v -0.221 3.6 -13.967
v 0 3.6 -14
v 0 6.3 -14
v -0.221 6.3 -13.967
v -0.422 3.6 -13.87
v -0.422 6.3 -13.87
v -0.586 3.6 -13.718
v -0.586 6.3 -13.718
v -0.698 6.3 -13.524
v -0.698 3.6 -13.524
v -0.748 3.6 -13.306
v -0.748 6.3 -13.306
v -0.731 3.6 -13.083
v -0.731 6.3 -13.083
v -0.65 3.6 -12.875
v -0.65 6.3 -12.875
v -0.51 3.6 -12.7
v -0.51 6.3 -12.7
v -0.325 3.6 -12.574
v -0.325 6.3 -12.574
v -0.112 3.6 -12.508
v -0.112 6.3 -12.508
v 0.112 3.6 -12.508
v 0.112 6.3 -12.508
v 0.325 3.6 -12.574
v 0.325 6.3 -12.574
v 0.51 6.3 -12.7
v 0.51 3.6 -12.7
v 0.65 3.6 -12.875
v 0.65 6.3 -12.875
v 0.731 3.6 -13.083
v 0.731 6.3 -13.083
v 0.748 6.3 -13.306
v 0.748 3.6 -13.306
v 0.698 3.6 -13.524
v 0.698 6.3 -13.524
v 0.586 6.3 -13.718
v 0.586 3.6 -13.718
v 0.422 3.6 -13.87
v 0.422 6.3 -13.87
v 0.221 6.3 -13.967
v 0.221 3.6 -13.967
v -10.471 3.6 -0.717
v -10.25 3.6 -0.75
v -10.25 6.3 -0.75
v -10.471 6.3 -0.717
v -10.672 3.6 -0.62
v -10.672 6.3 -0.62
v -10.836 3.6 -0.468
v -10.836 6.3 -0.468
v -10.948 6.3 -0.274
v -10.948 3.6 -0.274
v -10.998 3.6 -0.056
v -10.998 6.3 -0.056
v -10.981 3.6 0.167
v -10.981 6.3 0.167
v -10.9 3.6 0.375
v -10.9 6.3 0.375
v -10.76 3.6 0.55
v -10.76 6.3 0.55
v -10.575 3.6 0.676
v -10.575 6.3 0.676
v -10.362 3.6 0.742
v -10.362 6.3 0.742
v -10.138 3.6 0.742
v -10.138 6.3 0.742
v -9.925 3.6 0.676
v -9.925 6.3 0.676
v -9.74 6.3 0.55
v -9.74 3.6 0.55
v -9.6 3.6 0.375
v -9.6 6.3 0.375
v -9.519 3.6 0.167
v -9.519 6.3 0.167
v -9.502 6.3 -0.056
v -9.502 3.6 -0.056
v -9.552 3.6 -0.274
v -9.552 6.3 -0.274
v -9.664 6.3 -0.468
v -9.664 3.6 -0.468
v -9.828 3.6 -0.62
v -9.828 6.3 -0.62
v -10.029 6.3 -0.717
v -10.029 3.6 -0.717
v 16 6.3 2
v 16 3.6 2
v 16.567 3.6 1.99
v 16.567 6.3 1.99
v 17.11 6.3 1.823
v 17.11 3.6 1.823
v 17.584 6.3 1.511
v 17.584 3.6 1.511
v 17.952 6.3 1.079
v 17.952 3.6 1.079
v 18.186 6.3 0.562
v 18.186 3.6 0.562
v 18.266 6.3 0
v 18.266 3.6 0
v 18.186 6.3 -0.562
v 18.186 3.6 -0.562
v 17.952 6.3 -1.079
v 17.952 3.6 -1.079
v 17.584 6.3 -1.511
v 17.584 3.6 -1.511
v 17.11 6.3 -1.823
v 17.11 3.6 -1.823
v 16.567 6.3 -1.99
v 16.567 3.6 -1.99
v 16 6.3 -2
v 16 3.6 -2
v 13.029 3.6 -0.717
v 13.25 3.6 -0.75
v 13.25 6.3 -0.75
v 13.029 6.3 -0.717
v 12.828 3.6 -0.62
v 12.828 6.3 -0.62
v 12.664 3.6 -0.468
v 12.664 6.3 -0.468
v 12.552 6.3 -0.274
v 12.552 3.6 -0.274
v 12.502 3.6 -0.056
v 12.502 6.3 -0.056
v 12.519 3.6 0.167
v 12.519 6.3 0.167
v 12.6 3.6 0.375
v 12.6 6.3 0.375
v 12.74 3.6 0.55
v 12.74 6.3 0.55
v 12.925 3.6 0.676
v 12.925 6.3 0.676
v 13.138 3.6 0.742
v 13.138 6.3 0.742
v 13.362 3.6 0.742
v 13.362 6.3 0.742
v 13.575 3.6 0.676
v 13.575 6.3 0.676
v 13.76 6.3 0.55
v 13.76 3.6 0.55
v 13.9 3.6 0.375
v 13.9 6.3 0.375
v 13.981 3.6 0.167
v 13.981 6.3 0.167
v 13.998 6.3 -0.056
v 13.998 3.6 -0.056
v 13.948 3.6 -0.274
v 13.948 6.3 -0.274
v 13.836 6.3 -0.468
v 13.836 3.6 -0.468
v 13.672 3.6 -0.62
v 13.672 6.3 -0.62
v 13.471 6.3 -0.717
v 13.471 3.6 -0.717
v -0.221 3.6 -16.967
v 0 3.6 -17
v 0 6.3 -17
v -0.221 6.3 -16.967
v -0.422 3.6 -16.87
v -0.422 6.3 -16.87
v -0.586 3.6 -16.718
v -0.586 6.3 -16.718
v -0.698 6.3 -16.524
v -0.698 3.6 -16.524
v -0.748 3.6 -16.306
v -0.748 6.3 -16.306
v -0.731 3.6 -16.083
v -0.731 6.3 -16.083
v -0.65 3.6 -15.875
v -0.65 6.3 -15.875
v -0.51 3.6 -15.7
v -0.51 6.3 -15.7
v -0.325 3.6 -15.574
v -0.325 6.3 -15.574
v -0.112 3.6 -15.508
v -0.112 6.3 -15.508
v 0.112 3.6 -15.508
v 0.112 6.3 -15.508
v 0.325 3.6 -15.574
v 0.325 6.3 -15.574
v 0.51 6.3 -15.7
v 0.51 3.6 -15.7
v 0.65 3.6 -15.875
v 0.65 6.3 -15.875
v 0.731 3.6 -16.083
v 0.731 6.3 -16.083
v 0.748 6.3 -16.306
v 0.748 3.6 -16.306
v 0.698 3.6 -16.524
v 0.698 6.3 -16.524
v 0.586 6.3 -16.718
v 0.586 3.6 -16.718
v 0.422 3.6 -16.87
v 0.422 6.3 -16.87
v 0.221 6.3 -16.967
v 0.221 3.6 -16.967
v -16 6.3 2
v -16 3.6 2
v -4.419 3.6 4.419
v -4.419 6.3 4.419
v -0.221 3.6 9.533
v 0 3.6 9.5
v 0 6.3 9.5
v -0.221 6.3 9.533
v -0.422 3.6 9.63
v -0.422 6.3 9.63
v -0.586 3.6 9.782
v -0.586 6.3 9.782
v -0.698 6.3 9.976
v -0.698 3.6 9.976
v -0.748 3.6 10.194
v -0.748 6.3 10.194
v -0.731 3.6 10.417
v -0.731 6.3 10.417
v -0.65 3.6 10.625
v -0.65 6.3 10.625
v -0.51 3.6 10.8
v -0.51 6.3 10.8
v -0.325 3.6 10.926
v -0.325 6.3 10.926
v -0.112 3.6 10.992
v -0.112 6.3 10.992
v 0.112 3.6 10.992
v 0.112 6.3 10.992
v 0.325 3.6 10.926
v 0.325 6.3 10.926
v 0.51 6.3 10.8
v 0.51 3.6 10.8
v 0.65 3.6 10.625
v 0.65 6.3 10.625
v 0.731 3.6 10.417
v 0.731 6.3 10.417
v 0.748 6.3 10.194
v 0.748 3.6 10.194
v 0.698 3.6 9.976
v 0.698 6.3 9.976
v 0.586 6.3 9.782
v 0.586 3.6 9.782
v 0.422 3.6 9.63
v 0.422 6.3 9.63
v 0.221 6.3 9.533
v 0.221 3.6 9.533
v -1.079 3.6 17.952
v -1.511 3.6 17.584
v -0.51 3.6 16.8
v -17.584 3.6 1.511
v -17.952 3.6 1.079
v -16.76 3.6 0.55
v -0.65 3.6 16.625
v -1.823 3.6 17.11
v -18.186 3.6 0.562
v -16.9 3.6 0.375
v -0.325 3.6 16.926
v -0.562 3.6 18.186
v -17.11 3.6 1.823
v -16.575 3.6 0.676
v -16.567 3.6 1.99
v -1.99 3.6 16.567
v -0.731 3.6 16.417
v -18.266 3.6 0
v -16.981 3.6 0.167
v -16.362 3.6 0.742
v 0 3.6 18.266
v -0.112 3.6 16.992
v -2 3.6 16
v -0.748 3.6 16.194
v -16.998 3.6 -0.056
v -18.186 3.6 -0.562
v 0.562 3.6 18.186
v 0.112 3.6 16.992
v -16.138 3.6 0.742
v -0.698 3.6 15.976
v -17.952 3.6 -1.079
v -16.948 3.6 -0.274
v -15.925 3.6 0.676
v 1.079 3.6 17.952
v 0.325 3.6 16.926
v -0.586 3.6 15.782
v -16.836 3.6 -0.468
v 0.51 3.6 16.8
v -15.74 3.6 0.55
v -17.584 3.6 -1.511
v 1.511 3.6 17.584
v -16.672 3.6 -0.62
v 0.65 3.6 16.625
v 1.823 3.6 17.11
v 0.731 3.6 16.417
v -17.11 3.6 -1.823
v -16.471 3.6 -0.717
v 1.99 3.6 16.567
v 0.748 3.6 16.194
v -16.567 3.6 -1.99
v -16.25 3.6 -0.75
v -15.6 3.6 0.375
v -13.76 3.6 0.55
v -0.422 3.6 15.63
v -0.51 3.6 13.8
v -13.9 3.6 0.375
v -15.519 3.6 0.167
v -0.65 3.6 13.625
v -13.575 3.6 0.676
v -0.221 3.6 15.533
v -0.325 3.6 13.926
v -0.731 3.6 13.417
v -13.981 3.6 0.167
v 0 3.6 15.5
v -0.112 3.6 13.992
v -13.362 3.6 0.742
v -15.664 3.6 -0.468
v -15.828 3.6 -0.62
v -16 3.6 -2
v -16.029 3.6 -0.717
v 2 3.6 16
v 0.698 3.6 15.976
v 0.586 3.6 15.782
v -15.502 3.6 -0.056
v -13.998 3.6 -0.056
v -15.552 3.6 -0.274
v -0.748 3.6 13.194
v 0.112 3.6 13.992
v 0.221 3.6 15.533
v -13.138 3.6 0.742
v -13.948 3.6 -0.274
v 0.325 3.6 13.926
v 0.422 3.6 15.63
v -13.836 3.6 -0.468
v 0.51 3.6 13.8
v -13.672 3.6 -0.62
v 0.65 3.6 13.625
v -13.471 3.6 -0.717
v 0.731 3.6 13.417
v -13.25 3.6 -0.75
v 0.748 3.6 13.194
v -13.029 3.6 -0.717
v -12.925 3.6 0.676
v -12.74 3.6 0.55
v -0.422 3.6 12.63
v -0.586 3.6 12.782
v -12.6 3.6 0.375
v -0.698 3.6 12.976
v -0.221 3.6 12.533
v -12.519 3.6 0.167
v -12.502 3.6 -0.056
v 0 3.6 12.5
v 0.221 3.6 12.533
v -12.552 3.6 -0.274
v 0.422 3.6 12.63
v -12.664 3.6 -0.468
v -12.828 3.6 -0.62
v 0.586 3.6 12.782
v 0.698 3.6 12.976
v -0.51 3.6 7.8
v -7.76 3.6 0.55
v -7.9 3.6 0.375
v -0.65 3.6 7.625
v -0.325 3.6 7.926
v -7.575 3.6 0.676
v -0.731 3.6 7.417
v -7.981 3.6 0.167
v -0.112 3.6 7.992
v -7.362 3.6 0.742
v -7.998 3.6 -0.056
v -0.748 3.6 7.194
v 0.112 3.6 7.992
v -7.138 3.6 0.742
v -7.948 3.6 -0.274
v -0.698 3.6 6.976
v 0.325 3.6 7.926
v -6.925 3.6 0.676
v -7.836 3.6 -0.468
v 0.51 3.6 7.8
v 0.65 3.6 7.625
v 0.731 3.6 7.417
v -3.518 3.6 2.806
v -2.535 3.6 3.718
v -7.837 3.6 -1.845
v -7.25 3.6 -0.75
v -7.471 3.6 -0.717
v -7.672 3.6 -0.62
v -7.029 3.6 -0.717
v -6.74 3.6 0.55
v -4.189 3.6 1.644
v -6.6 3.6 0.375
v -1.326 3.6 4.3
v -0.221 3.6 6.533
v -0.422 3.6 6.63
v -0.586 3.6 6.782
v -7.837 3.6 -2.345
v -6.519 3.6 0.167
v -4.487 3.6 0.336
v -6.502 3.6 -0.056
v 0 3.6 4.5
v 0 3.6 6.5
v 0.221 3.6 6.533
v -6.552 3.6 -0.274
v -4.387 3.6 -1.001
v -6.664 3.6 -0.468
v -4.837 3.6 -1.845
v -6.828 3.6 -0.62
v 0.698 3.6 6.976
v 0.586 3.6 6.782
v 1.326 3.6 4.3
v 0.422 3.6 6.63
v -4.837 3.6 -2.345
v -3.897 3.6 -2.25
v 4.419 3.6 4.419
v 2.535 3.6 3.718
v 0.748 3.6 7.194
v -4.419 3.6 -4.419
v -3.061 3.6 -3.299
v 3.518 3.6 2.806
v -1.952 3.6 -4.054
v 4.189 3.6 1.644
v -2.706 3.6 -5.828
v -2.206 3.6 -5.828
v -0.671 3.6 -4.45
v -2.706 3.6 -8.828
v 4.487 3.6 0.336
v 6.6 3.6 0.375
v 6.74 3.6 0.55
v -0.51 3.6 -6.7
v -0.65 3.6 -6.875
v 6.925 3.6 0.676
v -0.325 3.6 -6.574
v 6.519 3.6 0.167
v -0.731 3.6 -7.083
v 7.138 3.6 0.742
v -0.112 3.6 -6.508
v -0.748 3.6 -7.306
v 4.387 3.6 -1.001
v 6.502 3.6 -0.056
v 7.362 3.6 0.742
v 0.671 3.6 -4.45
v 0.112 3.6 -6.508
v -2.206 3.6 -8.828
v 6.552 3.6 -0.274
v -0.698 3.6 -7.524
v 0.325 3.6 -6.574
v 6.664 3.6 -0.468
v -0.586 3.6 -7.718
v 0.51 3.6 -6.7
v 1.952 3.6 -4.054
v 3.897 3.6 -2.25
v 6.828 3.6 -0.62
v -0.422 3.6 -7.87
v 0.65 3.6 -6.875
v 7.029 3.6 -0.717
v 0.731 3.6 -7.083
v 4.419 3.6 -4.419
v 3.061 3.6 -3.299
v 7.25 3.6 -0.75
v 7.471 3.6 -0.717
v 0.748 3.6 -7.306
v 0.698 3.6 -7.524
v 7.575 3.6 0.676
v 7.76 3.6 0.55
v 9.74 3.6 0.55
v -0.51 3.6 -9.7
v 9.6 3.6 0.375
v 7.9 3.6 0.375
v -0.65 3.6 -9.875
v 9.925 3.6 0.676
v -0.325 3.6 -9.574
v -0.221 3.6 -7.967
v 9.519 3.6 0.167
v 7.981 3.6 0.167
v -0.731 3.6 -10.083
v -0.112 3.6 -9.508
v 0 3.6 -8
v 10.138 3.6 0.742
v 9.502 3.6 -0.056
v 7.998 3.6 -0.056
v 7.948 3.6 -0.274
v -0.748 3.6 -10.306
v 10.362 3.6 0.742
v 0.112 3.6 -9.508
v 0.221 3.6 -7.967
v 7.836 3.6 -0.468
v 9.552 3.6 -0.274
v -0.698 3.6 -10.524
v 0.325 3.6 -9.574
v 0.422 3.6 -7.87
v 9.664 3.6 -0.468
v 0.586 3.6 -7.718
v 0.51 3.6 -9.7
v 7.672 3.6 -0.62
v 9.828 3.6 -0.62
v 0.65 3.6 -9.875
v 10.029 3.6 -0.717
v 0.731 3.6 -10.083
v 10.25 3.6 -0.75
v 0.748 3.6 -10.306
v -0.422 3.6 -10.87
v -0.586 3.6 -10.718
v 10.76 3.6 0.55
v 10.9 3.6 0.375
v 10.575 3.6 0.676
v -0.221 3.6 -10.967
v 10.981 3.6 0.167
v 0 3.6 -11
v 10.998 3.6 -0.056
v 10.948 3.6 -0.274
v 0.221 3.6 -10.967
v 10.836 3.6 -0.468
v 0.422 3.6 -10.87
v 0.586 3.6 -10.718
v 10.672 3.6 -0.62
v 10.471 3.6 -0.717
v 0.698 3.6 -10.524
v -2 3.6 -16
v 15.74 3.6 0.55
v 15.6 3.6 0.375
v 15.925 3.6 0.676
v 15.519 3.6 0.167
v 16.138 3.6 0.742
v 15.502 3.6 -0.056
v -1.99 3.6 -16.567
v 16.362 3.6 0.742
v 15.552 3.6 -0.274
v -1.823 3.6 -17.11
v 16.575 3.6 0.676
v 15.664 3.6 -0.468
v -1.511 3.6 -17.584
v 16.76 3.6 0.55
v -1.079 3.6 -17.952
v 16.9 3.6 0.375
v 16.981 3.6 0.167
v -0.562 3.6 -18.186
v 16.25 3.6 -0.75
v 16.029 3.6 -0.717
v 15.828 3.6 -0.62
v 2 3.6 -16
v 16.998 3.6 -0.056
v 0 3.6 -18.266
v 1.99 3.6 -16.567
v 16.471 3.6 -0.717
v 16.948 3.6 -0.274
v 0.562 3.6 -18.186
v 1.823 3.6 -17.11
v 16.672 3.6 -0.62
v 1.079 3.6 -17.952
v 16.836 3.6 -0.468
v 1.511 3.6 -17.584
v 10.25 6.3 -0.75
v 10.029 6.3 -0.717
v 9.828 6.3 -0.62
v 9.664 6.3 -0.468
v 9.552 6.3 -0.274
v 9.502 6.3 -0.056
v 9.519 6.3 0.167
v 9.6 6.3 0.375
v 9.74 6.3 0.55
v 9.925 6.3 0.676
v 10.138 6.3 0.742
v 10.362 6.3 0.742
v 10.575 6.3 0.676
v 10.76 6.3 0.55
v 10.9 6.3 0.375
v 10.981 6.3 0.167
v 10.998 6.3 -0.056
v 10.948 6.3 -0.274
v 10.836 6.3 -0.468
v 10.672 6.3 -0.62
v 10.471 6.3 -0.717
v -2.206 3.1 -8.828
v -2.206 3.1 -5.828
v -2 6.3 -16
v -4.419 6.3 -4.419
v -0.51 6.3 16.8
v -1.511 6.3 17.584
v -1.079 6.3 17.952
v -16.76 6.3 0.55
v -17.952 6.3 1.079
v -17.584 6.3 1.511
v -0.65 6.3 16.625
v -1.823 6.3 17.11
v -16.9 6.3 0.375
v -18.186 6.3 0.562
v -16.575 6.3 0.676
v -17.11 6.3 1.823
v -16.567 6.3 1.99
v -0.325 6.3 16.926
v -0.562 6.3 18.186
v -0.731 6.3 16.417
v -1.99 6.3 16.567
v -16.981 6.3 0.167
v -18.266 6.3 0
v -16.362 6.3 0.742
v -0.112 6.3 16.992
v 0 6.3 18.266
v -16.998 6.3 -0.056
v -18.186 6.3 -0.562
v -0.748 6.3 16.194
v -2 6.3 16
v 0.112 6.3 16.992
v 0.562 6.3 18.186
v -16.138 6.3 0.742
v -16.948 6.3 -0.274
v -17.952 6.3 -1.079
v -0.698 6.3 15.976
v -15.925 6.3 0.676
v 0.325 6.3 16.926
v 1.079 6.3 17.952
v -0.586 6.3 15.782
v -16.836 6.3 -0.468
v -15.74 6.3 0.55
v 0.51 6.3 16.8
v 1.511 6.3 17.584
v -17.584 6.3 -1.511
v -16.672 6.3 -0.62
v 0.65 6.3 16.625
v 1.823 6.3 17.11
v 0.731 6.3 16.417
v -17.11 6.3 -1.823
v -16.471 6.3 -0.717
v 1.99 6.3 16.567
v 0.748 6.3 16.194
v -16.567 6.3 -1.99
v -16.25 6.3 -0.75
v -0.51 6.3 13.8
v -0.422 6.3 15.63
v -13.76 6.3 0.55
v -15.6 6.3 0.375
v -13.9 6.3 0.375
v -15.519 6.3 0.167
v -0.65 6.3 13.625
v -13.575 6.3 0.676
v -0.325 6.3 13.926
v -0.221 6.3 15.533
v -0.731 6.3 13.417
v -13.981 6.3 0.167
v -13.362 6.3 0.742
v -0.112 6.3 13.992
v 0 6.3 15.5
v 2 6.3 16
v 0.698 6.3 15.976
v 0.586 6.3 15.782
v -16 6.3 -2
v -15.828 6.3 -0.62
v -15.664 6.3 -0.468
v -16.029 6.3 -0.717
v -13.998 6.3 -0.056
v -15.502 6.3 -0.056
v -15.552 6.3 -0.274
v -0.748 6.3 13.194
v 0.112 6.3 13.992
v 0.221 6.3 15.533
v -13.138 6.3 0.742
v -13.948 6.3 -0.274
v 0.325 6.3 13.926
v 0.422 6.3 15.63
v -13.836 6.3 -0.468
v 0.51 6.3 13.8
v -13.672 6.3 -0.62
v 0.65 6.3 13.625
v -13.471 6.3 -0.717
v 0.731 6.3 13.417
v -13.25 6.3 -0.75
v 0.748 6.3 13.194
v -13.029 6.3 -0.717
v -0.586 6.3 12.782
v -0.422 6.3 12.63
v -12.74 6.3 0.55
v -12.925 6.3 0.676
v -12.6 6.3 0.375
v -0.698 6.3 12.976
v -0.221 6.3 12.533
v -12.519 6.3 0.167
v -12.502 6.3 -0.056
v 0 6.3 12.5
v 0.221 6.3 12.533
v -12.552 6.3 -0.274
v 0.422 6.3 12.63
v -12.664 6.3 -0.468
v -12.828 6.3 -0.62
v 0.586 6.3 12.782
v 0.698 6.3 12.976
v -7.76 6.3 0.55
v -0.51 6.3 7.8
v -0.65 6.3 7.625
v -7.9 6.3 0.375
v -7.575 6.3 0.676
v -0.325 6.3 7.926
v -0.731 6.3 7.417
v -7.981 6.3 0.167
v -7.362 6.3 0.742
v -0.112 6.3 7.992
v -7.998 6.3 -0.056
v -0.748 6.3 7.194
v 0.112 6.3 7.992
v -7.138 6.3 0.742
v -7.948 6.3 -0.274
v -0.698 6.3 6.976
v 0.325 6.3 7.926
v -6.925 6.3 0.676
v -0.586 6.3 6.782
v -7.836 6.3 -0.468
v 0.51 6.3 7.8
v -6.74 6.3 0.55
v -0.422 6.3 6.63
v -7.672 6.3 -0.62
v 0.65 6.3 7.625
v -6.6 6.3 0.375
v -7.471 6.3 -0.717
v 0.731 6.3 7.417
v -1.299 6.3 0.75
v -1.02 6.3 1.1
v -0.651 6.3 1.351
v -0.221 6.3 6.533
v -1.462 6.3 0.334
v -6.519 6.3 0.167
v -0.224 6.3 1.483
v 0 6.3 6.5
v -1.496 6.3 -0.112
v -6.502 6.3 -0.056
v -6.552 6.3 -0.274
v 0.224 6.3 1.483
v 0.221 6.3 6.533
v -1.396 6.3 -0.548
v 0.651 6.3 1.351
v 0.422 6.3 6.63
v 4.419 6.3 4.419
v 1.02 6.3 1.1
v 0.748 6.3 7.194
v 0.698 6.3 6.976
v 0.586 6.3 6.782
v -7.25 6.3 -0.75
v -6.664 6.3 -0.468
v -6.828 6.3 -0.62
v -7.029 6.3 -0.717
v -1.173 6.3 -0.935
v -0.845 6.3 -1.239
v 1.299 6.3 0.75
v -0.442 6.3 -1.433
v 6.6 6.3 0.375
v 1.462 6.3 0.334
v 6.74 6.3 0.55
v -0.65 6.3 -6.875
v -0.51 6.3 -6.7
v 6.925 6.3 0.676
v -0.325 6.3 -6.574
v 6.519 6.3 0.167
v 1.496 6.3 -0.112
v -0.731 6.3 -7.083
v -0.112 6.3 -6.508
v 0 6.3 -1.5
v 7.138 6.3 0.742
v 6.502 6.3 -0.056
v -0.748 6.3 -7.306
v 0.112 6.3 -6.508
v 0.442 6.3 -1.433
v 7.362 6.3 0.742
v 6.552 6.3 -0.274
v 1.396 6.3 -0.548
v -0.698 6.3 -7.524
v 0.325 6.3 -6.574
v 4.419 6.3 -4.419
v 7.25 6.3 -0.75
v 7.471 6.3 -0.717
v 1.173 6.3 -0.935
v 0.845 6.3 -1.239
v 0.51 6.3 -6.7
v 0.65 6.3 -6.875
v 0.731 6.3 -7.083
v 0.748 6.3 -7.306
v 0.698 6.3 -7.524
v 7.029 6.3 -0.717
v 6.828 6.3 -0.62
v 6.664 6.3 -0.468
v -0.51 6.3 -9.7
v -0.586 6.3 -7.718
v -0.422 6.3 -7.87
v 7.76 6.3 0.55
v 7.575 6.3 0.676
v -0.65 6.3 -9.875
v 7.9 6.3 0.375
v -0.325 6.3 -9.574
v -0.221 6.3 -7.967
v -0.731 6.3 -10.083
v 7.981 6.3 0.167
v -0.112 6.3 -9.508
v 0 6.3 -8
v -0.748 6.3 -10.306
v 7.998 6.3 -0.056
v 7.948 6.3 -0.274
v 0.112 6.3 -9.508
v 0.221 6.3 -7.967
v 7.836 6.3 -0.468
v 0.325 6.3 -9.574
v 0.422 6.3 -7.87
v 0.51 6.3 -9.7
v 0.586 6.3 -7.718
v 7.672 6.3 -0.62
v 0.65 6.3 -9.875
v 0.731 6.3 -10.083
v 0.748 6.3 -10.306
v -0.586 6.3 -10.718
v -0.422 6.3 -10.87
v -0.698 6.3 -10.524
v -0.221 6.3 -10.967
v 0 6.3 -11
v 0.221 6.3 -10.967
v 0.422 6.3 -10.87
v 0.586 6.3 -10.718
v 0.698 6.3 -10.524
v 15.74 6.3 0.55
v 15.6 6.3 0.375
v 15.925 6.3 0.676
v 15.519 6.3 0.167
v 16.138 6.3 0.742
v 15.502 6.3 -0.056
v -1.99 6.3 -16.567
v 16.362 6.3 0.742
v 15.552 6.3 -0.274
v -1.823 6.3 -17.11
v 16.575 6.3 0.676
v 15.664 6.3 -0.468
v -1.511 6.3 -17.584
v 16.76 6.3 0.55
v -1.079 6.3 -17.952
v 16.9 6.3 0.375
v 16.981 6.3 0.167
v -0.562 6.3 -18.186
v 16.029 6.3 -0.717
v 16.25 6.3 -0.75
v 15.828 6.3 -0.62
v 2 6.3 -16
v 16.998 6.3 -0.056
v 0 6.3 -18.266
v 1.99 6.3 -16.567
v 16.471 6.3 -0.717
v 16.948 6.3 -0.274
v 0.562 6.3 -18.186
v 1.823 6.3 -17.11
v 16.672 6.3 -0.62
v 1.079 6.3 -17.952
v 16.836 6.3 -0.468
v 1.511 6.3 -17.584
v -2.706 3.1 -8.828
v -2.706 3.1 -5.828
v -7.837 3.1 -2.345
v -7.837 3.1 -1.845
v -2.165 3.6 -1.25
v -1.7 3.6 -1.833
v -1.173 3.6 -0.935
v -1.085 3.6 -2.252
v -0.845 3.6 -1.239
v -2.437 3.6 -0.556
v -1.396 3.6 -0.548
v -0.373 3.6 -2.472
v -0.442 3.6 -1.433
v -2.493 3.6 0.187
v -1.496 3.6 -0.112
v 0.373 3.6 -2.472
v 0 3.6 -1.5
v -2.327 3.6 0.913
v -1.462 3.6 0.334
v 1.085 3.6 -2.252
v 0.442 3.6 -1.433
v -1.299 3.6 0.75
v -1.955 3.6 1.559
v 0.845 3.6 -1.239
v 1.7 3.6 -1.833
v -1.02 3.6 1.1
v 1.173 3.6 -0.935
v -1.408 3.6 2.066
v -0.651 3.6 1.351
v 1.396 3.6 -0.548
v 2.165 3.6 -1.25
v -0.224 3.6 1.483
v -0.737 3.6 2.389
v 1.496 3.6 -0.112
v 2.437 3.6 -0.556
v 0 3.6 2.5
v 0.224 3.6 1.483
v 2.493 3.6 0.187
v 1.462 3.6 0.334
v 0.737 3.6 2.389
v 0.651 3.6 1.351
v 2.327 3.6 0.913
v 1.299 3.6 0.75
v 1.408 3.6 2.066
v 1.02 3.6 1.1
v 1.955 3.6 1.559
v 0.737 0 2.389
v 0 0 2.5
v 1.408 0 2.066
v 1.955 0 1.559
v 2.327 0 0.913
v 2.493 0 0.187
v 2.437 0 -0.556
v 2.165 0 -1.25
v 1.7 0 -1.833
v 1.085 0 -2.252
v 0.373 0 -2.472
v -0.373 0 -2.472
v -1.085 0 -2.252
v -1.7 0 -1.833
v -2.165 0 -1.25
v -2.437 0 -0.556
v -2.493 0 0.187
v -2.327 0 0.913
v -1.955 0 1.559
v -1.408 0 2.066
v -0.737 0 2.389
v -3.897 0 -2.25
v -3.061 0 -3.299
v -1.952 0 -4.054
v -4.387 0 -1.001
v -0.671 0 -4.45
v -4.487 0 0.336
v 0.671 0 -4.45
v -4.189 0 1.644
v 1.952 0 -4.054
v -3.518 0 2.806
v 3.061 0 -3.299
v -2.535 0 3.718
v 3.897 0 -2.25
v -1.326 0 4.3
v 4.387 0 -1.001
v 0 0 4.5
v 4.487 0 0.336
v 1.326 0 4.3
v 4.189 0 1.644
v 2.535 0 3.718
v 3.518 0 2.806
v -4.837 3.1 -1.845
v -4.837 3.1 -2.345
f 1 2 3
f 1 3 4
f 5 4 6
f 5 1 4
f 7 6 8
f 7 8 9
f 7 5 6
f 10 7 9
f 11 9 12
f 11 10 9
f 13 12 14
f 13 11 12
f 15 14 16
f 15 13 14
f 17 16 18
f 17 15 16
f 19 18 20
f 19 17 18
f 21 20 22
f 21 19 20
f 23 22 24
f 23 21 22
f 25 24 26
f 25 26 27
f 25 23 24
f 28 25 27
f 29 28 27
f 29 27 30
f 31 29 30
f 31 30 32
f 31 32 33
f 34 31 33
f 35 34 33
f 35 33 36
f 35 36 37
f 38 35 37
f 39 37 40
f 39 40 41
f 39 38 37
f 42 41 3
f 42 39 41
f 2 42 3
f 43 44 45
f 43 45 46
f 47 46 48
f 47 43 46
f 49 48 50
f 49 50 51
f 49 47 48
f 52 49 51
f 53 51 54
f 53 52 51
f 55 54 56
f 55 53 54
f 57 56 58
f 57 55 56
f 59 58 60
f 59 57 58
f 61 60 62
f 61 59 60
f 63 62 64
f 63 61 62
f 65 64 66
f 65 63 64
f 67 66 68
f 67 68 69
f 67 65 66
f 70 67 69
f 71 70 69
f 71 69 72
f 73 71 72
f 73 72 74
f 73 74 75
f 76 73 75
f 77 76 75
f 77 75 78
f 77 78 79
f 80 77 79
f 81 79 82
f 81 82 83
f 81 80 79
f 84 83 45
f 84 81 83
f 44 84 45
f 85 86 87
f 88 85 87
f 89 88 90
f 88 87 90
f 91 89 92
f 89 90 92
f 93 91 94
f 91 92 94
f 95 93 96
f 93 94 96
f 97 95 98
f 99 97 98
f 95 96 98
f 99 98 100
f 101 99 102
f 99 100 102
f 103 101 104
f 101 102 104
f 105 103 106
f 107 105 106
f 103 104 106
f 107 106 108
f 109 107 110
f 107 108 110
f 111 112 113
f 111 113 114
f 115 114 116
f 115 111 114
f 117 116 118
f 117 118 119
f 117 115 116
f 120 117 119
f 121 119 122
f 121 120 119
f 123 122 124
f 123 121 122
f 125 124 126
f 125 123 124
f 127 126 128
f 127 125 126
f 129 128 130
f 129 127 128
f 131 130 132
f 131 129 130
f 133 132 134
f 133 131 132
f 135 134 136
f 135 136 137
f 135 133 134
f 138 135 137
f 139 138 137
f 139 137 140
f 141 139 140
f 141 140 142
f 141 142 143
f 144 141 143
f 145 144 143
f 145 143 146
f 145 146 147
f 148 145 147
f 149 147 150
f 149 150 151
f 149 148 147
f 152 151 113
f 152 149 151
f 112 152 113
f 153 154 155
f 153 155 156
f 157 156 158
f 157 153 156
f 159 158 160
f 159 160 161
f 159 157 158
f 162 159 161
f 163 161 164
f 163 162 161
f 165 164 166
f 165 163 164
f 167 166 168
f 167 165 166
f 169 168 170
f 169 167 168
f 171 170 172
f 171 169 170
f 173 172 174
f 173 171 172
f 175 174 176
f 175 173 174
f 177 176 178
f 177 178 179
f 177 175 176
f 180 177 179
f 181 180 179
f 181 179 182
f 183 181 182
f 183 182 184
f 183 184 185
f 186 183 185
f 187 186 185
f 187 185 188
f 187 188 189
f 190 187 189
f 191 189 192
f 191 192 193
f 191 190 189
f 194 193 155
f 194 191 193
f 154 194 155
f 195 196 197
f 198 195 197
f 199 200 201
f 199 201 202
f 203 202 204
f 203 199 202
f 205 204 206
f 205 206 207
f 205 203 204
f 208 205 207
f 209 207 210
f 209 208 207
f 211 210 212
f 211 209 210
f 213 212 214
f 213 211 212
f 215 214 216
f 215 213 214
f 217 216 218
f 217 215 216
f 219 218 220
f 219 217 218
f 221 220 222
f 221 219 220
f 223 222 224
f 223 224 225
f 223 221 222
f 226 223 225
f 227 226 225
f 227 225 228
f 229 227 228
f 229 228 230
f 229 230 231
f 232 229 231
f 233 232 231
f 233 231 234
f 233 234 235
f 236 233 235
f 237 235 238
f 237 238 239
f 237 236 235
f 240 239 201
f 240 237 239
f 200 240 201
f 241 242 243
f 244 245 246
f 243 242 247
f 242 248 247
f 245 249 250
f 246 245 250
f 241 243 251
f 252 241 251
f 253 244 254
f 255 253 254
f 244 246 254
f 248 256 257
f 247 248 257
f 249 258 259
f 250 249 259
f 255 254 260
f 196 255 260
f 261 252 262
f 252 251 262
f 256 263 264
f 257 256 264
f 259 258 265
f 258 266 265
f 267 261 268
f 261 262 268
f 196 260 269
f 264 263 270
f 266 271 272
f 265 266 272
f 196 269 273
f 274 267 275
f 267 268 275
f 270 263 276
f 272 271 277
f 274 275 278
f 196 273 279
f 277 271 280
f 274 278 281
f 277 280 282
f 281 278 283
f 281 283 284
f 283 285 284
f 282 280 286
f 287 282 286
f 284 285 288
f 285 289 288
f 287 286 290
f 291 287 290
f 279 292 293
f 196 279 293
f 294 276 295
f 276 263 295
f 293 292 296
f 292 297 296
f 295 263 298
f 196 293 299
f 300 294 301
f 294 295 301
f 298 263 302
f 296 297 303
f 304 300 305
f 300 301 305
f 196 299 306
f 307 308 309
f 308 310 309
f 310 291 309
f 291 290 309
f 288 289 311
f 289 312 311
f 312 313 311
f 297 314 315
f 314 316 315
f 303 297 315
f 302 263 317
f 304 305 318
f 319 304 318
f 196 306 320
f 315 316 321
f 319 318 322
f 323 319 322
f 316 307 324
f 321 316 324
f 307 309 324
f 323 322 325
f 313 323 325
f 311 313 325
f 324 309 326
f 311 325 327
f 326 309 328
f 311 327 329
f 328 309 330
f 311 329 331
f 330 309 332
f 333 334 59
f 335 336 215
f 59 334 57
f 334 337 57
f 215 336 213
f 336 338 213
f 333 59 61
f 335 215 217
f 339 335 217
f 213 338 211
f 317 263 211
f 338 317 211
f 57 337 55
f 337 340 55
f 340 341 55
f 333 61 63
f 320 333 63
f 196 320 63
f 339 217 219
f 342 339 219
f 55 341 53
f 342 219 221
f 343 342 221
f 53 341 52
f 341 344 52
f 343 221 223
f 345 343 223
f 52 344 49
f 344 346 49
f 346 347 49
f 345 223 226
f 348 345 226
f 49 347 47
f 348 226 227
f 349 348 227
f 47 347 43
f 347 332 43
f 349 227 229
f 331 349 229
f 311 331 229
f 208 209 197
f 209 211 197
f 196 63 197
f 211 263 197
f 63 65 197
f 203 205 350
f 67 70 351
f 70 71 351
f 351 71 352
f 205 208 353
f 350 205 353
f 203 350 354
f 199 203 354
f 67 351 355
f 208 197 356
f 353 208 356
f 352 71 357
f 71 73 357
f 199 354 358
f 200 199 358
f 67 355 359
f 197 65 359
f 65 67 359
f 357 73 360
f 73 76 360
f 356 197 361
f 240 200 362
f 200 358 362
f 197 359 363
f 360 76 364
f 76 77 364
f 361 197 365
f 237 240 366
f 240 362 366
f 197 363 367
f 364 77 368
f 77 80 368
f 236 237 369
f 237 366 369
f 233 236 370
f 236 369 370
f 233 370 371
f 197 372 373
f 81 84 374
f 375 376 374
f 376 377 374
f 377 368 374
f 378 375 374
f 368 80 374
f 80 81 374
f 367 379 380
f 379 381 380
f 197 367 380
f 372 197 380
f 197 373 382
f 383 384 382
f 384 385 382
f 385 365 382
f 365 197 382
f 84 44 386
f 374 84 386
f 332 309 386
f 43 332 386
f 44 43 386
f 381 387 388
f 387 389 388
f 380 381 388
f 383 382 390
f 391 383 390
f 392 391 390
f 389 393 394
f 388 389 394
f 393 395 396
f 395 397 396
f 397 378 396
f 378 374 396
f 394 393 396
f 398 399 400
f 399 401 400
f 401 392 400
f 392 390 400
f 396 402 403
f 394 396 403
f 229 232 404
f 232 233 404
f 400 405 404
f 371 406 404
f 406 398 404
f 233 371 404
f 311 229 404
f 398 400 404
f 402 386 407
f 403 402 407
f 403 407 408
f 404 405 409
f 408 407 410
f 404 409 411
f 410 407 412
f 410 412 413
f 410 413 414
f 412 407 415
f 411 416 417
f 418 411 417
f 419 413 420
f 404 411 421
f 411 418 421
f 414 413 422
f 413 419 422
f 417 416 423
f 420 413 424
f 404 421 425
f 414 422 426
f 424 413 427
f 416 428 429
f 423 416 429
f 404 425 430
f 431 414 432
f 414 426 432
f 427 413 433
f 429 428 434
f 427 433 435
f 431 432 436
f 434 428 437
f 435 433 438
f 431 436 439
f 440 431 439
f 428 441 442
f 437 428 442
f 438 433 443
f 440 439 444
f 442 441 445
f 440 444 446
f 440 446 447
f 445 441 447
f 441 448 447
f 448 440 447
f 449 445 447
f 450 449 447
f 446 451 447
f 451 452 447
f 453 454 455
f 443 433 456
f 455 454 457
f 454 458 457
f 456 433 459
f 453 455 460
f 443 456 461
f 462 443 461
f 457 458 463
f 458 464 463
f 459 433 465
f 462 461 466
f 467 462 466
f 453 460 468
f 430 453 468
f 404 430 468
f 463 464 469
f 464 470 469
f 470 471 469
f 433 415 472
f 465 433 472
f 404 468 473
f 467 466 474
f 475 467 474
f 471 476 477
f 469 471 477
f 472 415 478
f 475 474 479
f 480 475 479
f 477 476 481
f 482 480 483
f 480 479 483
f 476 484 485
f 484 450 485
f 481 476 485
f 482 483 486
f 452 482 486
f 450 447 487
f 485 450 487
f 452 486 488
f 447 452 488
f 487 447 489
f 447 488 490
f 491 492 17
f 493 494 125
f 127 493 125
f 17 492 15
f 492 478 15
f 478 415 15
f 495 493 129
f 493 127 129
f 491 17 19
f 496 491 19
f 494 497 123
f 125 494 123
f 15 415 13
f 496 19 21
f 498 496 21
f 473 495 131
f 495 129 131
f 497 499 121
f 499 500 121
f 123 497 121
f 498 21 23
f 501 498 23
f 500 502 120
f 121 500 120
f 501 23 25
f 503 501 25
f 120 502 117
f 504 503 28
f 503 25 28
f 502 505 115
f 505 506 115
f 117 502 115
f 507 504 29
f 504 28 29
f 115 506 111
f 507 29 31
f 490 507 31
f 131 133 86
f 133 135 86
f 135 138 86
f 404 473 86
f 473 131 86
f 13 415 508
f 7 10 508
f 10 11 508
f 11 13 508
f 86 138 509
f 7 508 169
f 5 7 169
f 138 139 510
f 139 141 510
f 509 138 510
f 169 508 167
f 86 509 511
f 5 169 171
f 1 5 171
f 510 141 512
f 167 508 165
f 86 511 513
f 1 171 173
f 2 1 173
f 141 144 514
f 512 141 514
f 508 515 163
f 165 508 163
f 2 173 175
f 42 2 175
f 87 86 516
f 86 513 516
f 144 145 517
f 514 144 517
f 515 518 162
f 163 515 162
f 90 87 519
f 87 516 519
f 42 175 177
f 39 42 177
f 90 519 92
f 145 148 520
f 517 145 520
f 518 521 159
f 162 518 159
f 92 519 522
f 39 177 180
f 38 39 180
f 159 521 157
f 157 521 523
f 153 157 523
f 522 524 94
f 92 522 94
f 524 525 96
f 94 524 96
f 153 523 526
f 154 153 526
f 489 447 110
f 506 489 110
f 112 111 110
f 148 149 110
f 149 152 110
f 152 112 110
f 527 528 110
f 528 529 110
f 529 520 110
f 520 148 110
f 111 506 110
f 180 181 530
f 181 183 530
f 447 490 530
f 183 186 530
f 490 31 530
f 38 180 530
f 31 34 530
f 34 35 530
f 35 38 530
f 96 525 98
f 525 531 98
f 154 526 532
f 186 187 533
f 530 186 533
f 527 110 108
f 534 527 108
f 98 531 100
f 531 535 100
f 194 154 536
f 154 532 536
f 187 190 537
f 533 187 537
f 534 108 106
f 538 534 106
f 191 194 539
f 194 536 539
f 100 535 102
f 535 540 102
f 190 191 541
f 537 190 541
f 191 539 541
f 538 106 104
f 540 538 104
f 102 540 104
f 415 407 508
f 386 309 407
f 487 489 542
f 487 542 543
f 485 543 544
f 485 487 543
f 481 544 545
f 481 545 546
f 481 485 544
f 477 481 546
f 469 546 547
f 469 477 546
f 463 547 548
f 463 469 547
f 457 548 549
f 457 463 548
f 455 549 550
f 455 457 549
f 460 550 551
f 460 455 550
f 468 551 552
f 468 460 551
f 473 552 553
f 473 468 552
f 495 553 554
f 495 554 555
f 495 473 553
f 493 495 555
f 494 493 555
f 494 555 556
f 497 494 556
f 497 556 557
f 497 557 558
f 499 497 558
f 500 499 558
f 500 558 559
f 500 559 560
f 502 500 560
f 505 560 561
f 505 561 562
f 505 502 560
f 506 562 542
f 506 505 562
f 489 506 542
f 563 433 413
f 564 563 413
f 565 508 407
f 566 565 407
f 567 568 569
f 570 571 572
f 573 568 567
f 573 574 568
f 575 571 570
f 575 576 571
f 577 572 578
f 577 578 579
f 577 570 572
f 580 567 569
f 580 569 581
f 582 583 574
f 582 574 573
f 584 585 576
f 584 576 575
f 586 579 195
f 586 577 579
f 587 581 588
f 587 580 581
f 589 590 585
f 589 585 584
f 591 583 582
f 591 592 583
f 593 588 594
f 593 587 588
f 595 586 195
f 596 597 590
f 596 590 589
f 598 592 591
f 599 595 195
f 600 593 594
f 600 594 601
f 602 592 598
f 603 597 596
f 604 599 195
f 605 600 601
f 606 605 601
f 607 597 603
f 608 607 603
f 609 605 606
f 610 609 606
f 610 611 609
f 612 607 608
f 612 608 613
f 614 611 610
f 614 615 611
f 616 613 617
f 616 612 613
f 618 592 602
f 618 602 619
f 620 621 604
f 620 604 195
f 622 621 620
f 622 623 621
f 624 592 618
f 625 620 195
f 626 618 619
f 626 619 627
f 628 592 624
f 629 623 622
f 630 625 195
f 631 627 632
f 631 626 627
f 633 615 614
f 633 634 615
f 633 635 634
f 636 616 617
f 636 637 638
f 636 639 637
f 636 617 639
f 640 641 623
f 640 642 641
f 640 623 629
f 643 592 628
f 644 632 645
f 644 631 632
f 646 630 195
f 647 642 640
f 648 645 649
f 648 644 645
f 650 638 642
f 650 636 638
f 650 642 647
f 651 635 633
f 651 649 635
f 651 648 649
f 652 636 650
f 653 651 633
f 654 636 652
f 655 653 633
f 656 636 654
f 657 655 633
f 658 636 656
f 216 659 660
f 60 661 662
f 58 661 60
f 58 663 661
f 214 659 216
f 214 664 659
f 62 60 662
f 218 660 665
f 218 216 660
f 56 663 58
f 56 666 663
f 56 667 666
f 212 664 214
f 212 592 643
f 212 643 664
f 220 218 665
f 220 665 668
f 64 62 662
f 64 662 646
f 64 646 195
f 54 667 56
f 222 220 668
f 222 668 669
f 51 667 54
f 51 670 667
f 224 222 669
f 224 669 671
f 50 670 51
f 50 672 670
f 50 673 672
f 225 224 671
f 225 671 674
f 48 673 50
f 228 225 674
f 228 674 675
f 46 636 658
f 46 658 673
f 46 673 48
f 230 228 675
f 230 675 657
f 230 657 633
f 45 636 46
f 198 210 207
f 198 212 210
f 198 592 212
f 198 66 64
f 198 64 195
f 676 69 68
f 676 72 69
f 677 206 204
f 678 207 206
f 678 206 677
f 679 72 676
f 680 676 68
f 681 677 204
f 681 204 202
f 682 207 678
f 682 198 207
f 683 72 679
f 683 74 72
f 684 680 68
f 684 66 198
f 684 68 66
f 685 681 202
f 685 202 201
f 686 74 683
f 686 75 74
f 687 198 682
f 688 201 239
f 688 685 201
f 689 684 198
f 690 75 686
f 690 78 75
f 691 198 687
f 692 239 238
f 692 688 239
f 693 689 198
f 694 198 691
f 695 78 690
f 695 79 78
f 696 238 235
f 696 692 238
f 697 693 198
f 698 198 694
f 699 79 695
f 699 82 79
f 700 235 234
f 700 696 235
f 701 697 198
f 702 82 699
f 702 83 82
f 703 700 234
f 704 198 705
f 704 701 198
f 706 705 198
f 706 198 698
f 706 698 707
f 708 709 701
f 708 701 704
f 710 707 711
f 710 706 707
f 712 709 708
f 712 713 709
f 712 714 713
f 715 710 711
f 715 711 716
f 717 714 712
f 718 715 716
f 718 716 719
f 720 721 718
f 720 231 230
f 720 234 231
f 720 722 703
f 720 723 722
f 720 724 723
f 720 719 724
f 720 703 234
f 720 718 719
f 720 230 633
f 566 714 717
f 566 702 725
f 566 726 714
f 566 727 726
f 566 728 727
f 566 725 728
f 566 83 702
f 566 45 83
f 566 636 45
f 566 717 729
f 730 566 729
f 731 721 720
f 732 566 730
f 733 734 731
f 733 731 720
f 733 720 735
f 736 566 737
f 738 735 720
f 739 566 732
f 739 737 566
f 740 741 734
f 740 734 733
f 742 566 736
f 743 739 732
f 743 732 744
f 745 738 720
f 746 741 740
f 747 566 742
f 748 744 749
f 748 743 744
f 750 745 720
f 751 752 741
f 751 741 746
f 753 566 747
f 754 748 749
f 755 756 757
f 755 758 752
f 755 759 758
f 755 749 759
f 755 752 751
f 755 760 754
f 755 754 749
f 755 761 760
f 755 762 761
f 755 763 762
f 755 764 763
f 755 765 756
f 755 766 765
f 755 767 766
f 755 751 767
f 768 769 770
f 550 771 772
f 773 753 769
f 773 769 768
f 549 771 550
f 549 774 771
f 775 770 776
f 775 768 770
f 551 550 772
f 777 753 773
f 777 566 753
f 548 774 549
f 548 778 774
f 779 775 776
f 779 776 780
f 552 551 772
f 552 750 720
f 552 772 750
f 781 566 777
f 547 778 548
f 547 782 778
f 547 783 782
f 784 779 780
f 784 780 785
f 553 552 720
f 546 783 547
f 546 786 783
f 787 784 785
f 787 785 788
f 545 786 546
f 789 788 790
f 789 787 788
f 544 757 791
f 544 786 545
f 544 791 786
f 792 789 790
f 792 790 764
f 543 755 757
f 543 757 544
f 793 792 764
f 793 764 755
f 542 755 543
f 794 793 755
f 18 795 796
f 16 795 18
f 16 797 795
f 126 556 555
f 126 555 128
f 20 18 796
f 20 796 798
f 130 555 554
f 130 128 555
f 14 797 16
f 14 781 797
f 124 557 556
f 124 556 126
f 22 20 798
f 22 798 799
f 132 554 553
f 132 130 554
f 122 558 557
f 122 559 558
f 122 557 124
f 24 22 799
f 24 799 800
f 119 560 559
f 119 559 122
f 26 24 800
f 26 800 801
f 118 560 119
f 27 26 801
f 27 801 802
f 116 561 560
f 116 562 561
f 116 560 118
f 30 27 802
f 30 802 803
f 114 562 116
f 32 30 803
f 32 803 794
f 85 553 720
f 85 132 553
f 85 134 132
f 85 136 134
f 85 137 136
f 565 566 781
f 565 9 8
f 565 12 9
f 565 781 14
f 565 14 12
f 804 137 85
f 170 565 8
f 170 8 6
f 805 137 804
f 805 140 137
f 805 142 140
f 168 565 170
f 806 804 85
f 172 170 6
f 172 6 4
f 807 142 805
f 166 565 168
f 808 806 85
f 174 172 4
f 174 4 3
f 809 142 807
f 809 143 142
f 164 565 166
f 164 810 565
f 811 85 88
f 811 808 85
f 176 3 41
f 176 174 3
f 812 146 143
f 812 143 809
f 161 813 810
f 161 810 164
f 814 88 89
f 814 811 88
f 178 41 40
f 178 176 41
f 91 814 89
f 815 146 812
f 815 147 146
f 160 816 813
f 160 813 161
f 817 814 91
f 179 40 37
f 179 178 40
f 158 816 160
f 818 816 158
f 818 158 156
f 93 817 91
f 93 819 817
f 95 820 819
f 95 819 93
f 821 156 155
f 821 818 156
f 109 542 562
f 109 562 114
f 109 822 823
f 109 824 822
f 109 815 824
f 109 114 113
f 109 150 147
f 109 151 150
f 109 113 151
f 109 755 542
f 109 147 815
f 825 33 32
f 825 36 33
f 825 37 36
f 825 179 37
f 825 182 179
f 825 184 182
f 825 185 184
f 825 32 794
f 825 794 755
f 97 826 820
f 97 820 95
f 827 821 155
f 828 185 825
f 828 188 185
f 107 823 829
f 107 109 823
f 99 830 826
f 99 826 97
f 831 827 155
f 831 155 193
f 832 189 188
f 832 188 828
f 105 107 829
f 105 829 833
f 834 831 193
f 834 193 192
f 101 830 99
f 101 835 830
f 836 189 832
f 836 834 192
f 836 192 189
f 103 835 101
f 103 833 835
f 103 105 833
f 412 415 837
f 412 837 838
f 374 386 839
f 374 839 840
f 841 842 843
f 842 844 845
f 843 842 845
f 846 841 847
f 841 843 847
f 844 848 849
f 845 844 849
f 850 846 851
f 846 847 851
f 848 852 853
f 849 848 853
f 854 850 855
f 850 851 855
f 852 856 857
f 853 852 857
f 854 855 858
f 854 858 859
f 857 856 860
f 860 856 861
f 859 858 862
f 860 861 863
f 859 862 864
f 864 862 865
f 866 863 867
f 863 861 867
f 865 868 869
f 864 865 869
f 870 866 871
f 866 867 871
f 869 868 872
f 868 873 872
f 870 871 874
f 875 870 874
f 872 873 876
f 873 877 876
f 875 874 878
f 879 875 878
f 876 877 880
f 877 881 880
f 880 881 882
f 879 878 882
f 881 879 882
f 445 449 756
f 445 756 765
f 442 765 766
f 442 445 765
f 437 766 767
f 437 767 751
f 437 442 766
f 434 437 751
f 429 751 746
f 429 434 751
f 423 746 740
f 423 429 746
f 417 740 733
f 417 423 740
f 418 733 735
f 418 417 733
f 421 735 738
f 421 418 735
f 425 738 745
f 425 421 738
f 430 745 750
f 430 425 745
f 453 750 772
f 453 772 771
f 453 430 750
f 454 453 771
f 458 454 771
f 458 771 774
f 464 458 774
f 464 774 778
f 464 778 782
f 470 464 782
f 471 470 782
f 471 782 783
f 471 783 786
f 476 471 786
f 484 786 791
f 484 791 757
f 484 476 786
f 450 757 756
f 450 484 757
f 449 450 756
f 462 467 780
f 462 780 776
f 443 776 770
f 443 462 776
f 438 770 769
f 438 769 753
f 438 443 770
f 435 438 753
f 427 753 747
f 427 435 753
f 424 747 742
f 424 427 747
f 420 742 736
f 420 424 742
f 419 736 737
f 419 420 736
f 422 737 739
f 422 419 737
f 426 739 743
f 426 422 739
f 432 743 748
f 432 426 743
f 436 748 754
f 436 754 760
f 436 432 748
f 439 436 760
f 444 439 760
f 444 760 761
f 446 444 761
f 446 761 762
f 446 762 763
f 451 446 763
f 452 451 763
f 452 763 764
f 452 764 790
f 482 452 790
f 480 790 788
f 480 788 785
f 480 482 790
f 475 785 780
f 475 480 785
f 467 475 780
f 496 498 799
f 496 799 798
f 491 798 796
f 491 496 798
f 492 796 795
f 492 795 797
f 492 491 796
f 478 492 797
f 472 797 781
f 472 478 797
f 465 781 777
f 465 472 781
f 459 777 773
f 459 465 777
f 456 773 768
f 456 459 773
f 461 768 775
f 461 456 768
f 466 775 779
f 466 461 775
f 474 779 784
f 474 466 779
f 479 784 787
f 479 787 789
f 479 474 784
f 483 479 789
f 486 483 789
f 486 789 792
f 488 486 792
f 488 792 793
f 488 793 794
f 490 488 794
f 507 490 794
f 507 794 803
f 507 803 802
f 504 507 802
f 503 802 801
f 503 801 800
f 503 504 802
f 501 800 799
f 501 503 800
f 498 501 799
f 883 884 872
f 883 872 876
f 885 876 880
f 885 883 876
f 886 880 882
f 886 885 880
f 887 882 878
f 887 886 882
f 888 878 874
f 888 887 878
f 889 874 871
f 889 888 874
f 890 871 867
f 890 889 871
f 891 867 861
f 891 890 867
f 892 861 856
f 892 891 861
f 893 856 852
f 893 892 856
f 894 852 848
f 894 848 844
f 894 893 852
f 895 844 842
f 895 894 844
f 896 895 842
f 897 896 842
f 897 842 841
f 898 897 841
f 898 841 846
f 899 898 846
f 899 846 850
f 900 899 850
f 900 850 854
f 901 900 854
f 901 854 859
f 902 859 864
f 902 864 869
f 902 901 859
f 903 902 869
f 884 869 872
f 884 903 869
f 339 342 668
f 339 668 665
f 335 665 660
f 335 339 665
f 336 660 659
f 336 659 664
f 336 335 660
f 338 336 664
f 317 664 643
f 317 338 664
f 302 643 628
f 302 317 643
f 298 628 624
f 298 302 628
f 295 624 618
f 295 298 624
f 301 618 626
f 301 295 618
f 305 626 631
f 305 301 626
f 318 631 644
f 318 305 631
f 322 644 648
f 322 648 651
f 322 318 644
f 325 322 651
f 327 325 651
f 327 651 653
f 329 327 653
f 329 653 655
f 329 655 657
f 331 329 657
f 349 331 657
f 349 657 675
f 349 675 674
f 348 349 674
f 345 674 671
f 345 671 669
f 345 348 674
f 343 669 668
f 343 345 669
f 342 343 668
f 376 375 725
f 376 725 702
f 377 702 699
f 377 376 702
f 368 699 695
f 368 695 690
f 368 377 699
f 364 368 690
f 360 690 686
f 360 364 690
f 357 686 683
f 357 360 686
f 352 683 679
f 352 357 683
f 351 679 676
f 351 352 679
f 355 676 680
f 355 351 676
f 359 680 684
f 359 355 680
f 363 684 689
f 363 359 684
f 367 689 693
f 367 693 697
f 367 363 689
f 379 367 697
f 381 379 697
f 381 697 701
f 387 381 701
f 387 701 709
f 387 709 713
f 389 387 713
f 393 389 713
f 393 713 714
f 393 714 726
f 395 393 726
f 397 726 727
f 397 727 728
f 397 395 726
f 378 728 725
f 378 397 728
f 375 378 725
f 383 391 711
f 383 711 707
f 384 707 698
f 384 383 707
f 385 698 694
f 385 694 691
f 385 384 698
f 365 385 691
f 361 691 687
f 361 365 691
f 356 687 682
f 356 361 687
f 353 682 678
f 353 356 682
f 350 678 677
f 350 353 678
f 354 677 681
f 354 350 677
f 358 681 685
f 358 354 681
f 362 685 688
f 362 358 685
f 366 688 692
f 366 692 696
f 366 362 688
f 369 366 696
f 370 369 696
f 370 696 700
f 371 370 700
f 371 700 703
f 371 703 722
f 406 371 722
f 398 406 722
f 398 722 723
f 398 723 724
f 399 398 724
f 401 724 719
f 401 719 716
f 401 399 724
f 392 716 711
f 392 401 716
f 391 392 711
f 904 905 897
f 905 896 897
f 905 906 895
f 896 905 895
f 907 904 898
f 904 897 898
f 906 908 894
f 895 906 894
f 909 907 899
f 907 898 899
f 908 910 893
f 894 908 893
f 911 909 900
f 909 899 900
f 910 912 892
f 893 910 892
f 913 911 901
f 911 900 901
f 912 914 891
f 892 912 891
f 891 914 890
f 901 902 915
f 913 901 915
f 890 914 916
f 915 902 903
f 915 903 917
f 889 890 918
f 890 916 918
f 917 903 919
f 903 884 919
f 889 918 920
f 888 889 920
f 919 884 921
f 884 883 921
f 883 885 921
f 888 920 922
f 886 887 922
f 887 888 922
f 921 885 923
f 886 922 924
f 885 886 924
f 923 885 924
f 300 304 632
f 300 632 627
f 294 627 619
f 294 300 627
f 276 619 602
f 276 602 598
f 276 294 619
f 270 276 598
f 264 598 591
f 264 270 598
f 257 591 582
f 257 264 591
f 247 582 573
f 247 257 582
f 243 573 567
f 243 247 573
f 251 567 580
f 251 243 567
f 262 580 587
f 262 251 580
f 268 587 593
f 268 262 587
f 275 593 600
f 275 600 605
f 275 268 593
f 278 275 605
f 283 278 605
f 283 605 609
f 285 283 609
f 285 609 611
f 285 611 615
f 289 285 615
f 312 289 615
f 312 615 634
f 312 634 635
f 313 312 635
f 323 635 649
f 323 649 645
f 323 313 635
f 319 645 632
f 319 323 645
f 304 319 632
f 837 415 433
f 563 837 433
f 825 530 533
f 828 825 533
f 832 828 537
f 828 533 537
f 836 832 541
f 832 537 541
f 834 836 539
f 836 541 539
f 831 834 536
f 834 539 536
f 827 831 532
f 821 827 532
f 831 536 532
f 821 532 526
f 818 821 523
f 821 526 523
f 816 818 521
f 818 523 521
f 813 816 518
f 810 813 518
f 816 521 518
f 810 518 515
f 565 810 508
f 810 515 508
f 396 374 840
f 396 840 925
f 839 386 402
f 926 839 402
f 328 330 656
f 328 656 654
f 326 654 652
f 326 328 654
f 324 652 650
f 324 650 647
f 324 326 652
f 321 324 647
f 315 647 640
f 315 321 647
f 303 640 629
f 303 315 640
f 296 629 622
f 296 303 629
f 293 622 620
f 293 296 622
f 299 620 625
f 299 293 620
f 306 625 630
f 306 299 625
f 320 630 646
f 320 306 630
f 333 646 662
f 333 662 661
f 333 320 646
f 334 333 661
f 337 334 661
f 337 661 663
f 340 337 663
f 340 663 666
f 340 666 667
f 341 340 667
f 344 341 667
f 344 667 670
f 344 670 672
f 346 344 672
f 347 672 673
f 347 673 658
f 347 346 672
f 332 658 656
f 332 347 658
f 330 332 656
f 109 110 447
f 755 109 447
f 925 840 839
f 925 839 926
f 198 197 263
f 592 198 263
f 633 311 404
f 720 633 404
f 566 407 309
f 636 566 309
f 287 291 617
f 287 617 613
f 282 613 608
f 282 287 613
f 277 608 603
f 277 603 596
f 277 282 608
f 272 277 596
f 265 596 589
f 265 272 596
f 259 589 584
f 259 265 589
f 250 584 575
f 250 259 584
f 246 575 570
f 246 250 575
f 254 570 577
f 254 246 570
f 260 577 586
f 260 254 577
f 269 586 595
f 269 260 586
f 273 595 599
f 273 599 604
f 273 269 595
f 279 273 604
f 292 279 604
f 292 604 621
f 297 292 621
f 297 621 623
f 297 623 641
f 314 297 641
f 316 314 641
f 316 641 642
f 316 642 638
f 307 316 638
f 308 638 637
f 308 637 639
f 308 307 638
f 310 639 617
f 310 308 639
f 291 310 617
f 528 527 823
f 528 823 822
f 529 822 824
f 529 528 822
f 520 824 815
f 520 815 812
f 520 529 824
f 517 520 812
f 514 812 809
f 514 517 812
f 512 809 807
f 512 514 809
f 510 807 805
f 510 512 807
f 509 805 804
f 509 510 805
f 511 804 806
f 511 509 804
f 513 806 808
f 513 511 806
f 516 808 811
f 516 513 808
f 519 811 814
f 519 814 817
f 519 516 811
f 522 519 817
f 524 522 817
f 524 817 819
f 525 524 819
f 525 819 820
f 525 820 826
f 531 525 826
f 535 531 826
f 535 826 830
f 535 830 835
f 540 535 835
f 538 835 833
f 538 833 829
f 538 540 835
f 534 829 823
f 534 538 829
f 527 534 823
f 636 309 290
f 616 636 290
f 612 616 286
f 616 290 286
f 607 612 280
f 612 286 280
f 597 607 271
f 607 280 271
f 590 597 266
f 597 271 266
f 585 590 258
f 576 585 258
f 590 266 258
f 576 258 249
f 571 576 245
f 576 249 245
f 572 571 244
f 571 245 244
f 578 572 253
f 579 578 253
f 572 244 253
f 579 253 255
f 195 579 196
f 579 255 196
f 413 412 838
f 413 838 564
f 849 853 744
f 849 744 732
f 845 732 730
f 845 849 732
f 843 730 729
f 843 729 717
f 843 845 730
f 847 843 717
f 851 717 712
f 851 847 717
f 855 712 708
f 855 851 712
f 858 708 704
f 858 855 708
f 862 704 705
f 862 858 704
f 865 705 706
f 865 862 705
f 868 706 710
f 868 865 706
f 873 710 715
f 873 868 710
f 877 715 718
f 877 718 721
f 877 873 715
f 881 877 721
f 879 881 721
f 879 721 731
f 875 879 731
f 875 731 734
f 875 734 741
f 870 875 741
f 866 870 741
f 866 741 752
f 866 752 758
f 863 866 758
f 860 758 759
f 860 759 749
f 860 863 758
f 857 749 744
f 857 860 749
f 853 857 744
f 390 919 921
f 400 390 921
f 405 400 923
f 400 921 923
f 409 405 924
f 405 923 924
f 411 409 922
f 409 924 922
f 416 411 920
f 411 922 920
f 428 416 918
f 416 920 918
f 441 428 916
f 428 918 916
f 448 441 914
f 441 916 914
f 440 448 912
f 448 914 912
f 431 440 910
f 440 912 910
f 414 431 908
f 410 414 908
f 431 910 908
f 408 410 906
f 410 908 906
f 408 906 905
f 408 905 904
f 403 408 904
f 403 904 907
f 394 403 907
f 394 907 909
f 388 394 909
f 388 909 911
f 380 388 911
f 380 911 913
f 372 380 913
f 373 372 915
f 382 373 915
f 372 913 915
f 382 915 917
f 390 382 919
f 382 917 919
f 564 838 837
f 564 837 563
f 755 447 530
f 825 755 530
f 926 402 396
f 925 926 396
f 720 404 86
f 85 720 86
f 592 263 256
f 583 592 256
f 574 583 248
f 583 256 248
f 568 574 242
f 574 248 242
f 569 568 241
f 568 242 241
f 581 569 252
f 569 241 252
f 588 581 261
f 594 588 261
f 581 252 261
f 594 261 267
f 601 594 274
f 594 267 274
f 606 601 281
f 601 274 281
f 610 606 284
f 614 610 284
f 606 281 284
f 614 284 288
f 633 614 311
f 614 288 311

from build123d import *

# Parameters (mm, degrees)
SKETCH1_R           = 4.5
SKETCH1_R_2         = 2.5
BOSS_EXTRUDE1_DEPTH = 3.6
SKETCH2_R           = 0.75
SKETCH2_R_2         = 6.25
SKETCH2_R_3         = 4.5
SKETCH2_R_4         = 2.5
SKETCH2_R_5         = 1.5
BOSS_EXTRUDE2_DEPTH = 2.7
SKETCH3_W           = 3
SKETCH3_H           = 0.5
SKETCH3_W_2         = 0.5
SKETCH3_H_2         = 3
BOSS_EXTRUDE3_DEPTH = 0.5


with BuildPart() as part:
    # Sketch1 → Boss-Extrude1 (new body)
    with BuildSketch(Plane(origin=(0, 0, 0), x_dir=(1, 0, 0), z_dir=(0, 1, 0))):
        with Locations(Location((0, 0, 0), (0, 0, 270))):
            Circle(SKETCH1_R)
        with Locations(Location((0, 0, 0), (0, 0, 270))):
            Circle(SKETCH1_R_2, mode=Mode.SUBTRACT)
    extrude(amount=BOSS_EXTRUDE1_DEPTH)

    # Sketch2 → Boss-Extrude2 (add)
    # profile 1 of 7: a face of its own
    with BuildSketch(Plane(origin=(0, 3.6, 0), x_dir=(1, 0, 0), z_dir=(0, 1, 0))):
        with BuildLine():
            ThreePointArc((4.419417382, -4.419417382), (0, -6.25), (-4.419417382, -4.419417382))
            Line((-4.419417382, -4.419417382), (-2, -16))
            ThreePointArc((-2, -16), (0, -18.265564437), (2, -16))
            Line((2, -16), (4.419417382, -4.419417382))
        make_face()
        with Locations(Location((0, -16.25, 0), (0, 0, 90))):
            Circle(SKETCH2_R, mode=Mode.SUBTRACT)
        with Locations(Location((0, -13.25, 0), (0, 0, 90))):
            Circle(SKETCH2_R, mode=Mode.SUBTRACT)
        with Locations(Location((0, -10.25, 0), (0, 0, 90))):
            Circle(SKETCH2_R, mode=Mode.SUBTRACT)
        with Locations(Location((0, -7.25, 0), (0, 0, 90))):
            Circle(SKETCH2_R, mode=Mode.SUBTRACT)
    # profile 2 of 7: a face of its own
    with BuildSketch(Plane(origin=(0, 3.6, 0), x_dir=(1, 0, 0), z_dir=(0, 1, 0))):
        with BuildLine():
            ThreePointArc((-4.419417382, -4.419417382), (-6.25, 0), (-4.419417382, 4.419417382))
            Line((-4.419417382, 4.419417382), (-16, 2))
            ThreePointArc((-16, 2), (-18.265564437, 0), (-16, -2))
            Line((-16, -2), (-4.419417382, -4.419417382))
        make_face()
        with Locations(Location((-16.25, 0, 0), (0, 0, 90))):
            Circle(SKETCH2_R, mode=Mode.SUBTRACT)
        with Locations(Location((-13.25, 0, 0), (0, 0, 90))):
            Circle(SKETCH2_R, mode=Mode.SUBTRACT)
        with Locations(Location((-10.25, 0, 0), (0, 0, 90))):
            Circle(SKETCH2_R, mode=Mode.SUBTRACT)
        with Locations(Location((-7.25, 0, 0), (0, 0, 90))):
            Circle(SKETCH2_R, mode=Mode.SUBTRACT)
    # profile 3 of 7: a face of its own
    with BuildSketch(Plane(origin=(0, 3.6, 0), x_dir=(1, 0, 0), z_dir=(0, 1, 0))):
        Circle(SKETCH2_R_2)
        with Locations(Location((0, 0, 0), (0, 0, 270))):
            Circle(SKETCH2_R_3, mode=Mode.SUBTRACT)
    # profile 4 of 7: a face of its own
    with BuildSketch(Plane(origin=(0, 3.6, 0), x_dir=(1, 0, 0), z_dir=(0, 1, 0))):
        with BuildLine():
            ThreePointArc((2, 16), (0, 18.265564437), (-2, 16))
            Line((-2, 16), (-4.419417382, 4.419417382))
            ThreePointArc((-4.419417382, 4.419417382), (0, 6.25), (4.419417382, 4.419417382))
            Line((4.419417382, 4.419417382), (2, 16))
        make_face()
        with Locations(Location((0, 7.25, 0), (0, 0, 90))):
            Circle(SKETCH2_R, mode=Mode.SUBTRACT)
        with Locations(Location((0, 10.25, 0), (0, 0, 90))):
            Circle(SKETCH2_R, mode=Mode.SUBTRACT)
        with Locations(Location((0, 13.25, 0), (0, 0, 90))):
            Circle(SKETCH2_R, mode=Mode.SUBTRACT)
        with Locations(Location((0, 16.25, 0), (0, 0, 90))):
            Circle(SKETCH2_R, mode=Mode.SUBTRACT)
    # profile 5 of 7: a face of its own
    with BuildSketch(Plane(origin=(0, 3.6, 0), x_dir=(1, 0, 0), z_dir=(0, 1, 0))):
        with BuildLine():
            Line((16, 2), (4.419417382, 4.419417382))
            ThreePointArc((4.419417382, 4.419417382), (5.774247078, 2.391771452), (6.25, 0))
            ThreePointArc((6.25, 0), (5.774247078, -2.391771452), (4.419417382, -4.419417382))
            Line((4.419417382, -4.419417382), (16, -2))
            ThreePointArc((16, -2), (18.265564437, 0), (16, 2))
        make_face()
        with Locations(Location((7.25, 0, 0), (0, 0, 90))):
            Circle(SKETCH2_R, mode=Mode.SUBTRACT)
        with Locations(Location((10.25, 0, 0), (0, 0, 90))):
            Circle(SKETCH2_R, mode=Mode.SUBTRACT)
        with Locations(Location((13.25, 0, 0), (0, 0, 90))):
            Circle(SKETCH2_R, mode=Mode.SUBTRACT)
        with Locations(Location((16.25, 0, 0), (0, 0, 90))):
            Circle(SKETCH2_R, mode=Mode.SUBTRACT)
    # profile 6 of 7: a face of its own
    with BuildSketch(Plane(origin=(0, 3.6, 0), x_dir=(1, 0, 0), z_dir=(0, 1, 0))):
        with Locations(Location((0, 0, 0), (0, 0, 270))):
            Circle(SKETCH2_R_3)
        with Locations(Location((0, 0, 0), (0, 0, 270))):
            Circle(SKETCH2_R_4, mode=Mode.SUBTRACT)
    # profile 7 of 7: a face of its own
    with BuildSketch(Plane(origin=(0, 3.6, 0), x_dir=(1, 0, 0), z_dir=(0, 1, 0))):
        with Locations(Location((0, 0, 0), (0, 0, 270))):
            Circle(SKETCH2_R_4)
        with Locations(Location((0, 0, 0), (0, 0, 90))):
            Circle(SKETCH2_R_5, mode=Mode.SUBTRACT)
    extrude(amount=BOSS_EXTRUDE2_DEPTH)

    # Sketch3 → Boss-Extrude3 (add)
    with BuildSketch(Plane.XZ.offset(-3.6)):
        with Locations((-6.336645362, -2.094924186)):
            Rectangle(SKETCH3_W, SKETCH3_H)
        with Locations((-2.456041922, -7.328306568)):
            Rectangle(SKETCH3_W_2, SKETCH3_H_2)
    extrude(amount=BOSS_EXTRUDE3_DEPTH)


solid = part.part
